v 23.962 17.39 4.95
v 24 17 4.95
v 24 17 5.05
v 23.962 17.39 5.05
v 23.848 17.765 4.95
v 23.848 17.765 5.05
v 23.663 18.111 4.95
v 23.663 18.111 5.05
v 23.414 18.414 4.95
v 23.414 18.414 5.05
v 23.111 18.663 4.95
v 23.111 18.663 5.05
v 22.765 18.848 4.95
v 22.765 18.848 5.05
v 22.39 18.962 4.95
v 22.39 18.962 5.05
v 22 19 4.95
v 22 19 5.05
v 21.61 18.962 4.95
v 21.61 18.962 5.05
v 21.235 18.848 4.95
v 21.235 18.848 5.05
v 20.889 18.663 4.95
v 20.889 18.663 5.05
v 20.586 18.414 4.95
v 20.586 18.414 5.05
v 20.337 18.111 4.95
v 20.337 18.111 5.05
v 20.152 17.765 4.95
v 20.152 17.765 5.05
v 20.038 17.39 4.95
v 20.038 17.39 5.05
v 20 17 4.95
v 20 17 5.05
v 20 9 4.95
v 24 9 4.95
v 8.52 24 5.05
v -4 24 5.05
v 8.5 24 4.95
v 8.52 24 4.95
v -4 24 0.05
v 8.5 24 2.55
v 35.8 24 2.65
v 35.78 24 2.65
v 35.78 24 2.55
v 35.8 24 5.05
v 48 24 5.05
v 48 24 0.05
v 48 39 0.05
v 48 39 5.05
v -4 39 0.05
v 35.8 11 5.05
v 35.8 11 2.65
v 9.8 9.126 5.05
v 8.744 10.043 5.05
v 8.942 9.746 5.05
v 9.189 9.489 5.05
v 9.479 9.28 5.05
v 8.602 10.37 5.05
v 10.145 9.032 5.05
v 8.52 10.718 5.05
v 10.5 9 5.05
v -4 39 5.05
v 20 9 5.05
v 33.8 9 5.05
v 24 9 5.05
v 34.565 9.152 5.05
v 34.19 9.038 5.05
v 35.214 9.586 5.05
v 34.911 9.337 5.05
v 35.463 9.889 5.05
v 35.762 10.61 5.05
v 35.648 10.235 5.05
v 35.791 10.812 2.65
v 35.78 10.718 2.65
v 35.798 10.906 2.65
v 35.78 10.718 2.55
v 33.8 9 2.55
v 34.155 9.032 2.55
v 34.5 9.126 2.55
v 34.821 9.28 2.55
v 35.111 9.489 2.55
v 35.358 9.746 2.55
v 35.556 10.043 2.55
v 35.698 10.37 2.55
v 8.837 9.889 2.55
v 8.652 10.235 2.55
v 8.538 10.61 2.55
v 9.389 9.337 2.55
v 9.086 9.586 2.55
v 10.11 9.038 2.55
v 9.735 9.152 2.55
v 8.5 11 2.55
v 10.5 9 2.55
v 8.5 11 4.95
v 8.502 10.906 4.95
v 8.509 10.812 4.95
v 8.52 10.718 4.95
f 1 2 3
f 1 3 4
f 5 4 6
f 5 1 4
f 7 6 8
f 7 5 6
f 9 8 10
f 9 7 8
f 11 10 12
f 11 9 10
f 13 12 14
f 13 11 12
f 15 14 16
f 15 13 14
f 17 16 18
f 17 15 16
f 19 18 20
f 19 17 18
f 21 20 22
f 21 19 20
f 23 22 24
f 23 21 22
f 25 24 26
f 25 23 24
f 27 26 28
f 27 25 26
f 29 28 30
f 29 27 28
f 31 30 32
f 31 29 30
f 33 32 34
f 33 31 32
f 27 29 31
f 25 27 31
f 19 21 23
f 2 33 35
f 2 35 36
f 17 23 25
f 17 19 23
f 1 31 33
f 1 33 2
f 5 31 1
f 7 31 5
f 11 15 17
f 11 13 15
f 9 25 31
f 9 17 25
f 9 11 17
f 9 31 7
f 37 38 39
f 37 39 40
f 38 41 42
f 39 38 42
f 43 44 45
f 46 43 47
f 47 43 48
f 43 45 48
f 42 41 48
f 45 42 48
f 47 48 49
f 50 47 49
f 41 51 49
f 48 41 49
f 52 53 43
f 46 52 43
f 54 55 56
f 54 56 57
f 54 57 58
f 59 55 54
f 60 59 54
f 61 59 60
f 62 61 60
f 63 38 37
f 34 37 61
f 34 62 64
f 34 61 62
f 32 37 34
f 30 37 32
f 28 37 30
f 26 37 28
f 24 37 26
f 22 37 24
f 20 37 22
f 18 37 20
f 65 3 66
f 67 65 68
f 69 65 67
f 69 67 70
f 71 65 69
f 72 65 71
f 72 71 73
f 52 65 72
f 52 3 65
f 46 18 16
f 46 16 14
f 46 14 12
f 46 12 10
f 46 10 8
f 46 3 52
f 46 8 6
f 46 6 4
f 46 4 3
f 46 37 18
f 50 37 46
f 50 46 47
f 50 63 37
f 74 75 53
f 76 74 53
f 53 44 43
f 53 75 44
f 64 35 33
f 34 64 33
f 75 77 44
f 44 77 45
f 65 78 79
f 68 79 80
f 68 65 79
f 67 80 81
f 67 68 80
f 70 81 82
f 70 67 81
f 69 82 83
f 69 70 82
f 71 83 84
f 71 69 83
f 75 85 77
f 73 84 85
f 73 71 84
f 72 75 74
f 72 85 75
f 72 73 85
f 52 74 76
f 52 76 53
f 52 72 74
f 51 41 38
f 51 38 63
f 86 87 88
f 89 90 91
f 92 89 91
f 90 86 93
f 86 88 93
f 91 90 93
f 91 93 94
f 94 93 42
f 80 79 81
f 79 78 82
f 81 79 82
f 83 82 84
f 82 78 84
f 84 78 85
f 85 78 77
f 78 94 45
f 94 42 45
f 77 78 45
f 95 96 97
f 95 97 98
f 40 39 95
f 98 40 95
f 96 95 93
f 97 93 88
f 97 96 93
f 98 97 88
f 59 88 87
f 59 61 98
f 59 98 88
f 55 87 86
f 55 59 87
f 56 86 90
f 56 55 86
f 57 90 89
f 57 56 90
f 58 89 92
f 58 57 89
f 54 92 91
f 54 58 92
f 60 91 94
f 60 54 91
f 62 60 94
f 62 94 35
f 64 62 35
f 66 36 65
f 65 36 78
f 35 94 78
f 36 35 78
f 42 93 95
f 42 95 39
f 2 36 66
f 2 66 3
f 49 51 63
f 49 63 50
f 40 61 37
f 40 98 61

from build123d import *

# Parameters (mm, degrees)
BOX033_W          = 27.28
BOX033_H          = 15
BOX033_DEPTH      = 2.4
BOX031_W          = 10
BOX031_H          = 15
BOX031_DEPTH      = 5
BOX032_W          = 10
BOX032_H          = 15
BOX032_DEPTH      = 5
BOX030_W          = 4
BOX030_H          = 16
BOX030_DEPTH      = 10
CYLINDER023_R     = 2
CYLINDER023_DEPTH = 10
BOX029_W          = 8.2
BOX029_H          = 15
BOX029_DEPTH      = 10
BOX028_W          = 8.52
BOX028_H          = 15
BOX028_DEPTH      = 10
BOX027_W          = 44
BOX027_H          = 15
BOX027_DEPTH      = 2.6
BOX026_W          = 44
BOX026_H          = 30
BOX026_DEPTH      = 5
FILLET006_R       = 2


with BuildPart() as cube033:
    # Box033 → Box033 (new body)
    with BuildSketch(Plane(origin=(8.5, 21, 2.5), x_dir=(1, 0, 0), z_dir=(0, 0, 1))):
        with Locations((13.64, 7.5)):
            Rectangle(BOX033_W, BOX033_H)
    extrude(amount=BOX033_DEPTH)


with BuildPart() as cube031:
    # Box031 → Box031 (new body)
    with BuildSketch(Plane(origin=(-4, 36, 0), x_dir=(1, 0, 0), z_dir=(0, 0, 1))):
        with Locations((5, 7.5)):
            Rectangle(BOX031_W, BOX031_H)
    extrude(amount=BOX031_DEPTH)


with BuildPart() as cube032:
    # Box032 → Box032 (new body)
    with BuildSketch(Plane(origin=(38, 36, 0), x_dir=(1, 0, 0), z_dir=(0, 0, 1))):
        with Locations((5, 7.5)):
            Rectangle(BOX032_W, BOX032_H)
    extrude(amount=BOX032_DEPTH)


with BuildPart() as cube030:
    # Box030 → Box030 (new body)
    with BuildSketch(Plane(origin=(20, -8, 0), x_dir=(1, 0, 0), z_dir=(0, 0, 1))):
        with Locations((2, 8)):
            Rectangle(BOX030_W, BOX030_H)
    extrude(amount=BOX030_DEPTH)


with BuildPart() as fusion024:
    # Cylinder023 → Cylinder023 (new body)
    with BuildSketch(Plane(origin=(22, 8, 0), x_dir=(1, 0, 0), z_dir=(0, 0, 1))):
        Circle(CYLINDER023_R)
    extrude(amount=CYLINDER023_DEPTH)

    # Fusion024: union Cube030
    add(cube030.part)


with BuildPart() as cube029:
    # Box029 → Box029 (new body)
    with BuildSketch(Plane(origin=(35.8, 0, 0), x_dir=(1, 0, 0), z_dir=(0, 0, 1))):
        with Locations((4.1, 7.5)):
            Rectangle(BOX029_W, BOX029_H)
    extrude(amount=BOX029_DEPTH)


with BuildPart() as cube028:
    # Box028 → Box028 (new body)
    with BuildSketch(Plane.XY):
        with Locations((4.26, 7.5)):
            Rectangle(BOX028_W, BOX028_H)
    extrude(amount=BOX028_DEPTH)


with BuildPart() as cube027:
    # Box027 → Box027 (new body)
    with BuildSketch(Plane.XY):
        with Locations((22, 7.5)):
            Rectangle(BOX027_W, BOX027_H)
    extrude(amount=BOX027_DEPTH)


with BuildPart() as exterior_parte2_v2_base:
    # Box026 → Box026 (new body)
    with BuildSketch(Plane.XY):
        with Locations((22, 15)):
            Rectangle(BOX026_W, BOX026_H)
    extrude(amount=BOX026_DEPTH)

    # Cut007002012: cut Cube027
    add(cube027.part, mode=Mode.SUBTRACT)

    # Cut007002013: cut Cube028
    add(cube028.part, mode=Mode.SUBTRACT)

    # Cut007002014: cut Cube029
    add(cube029.part, mode=Mode.SUBTRACT)

    # Cut007002015: cut Fusion024
    add(fusion024.part, mode=Mode.SUBTRACT)


with BuildPart() as exterior_parte2_v2_base_1:
    # Cut007002015 placement: moved
    add(exterior_parte2_v2_base.part.moved(Location((0, 21, 0))))

    # Fusion025: union Cube031, Cube032
    add(cube031.part)
    add(cube032.part)

    # Fusion026: union Cube033
    add(cube033.part)

    # Fillet006
    fillet006_edges = [exterior_parte2_v2_base_1.edges().sort_by_distance(p)[0] for p in [
        (8.5, 21, 3.7),
        (35.8, 21, 3.8),
    ]]
    fillet(fillet006_edges, radius=FILLET006_R)


with BuildPart() as exterior_parte2_v2_base_2:
    # Fillet006 placement: moved
    add(exterior_parte2_v2_base_1.part.moved(Location((0, -12, 0.05))))


solid = exterior_parte2_v2_base_2.part
